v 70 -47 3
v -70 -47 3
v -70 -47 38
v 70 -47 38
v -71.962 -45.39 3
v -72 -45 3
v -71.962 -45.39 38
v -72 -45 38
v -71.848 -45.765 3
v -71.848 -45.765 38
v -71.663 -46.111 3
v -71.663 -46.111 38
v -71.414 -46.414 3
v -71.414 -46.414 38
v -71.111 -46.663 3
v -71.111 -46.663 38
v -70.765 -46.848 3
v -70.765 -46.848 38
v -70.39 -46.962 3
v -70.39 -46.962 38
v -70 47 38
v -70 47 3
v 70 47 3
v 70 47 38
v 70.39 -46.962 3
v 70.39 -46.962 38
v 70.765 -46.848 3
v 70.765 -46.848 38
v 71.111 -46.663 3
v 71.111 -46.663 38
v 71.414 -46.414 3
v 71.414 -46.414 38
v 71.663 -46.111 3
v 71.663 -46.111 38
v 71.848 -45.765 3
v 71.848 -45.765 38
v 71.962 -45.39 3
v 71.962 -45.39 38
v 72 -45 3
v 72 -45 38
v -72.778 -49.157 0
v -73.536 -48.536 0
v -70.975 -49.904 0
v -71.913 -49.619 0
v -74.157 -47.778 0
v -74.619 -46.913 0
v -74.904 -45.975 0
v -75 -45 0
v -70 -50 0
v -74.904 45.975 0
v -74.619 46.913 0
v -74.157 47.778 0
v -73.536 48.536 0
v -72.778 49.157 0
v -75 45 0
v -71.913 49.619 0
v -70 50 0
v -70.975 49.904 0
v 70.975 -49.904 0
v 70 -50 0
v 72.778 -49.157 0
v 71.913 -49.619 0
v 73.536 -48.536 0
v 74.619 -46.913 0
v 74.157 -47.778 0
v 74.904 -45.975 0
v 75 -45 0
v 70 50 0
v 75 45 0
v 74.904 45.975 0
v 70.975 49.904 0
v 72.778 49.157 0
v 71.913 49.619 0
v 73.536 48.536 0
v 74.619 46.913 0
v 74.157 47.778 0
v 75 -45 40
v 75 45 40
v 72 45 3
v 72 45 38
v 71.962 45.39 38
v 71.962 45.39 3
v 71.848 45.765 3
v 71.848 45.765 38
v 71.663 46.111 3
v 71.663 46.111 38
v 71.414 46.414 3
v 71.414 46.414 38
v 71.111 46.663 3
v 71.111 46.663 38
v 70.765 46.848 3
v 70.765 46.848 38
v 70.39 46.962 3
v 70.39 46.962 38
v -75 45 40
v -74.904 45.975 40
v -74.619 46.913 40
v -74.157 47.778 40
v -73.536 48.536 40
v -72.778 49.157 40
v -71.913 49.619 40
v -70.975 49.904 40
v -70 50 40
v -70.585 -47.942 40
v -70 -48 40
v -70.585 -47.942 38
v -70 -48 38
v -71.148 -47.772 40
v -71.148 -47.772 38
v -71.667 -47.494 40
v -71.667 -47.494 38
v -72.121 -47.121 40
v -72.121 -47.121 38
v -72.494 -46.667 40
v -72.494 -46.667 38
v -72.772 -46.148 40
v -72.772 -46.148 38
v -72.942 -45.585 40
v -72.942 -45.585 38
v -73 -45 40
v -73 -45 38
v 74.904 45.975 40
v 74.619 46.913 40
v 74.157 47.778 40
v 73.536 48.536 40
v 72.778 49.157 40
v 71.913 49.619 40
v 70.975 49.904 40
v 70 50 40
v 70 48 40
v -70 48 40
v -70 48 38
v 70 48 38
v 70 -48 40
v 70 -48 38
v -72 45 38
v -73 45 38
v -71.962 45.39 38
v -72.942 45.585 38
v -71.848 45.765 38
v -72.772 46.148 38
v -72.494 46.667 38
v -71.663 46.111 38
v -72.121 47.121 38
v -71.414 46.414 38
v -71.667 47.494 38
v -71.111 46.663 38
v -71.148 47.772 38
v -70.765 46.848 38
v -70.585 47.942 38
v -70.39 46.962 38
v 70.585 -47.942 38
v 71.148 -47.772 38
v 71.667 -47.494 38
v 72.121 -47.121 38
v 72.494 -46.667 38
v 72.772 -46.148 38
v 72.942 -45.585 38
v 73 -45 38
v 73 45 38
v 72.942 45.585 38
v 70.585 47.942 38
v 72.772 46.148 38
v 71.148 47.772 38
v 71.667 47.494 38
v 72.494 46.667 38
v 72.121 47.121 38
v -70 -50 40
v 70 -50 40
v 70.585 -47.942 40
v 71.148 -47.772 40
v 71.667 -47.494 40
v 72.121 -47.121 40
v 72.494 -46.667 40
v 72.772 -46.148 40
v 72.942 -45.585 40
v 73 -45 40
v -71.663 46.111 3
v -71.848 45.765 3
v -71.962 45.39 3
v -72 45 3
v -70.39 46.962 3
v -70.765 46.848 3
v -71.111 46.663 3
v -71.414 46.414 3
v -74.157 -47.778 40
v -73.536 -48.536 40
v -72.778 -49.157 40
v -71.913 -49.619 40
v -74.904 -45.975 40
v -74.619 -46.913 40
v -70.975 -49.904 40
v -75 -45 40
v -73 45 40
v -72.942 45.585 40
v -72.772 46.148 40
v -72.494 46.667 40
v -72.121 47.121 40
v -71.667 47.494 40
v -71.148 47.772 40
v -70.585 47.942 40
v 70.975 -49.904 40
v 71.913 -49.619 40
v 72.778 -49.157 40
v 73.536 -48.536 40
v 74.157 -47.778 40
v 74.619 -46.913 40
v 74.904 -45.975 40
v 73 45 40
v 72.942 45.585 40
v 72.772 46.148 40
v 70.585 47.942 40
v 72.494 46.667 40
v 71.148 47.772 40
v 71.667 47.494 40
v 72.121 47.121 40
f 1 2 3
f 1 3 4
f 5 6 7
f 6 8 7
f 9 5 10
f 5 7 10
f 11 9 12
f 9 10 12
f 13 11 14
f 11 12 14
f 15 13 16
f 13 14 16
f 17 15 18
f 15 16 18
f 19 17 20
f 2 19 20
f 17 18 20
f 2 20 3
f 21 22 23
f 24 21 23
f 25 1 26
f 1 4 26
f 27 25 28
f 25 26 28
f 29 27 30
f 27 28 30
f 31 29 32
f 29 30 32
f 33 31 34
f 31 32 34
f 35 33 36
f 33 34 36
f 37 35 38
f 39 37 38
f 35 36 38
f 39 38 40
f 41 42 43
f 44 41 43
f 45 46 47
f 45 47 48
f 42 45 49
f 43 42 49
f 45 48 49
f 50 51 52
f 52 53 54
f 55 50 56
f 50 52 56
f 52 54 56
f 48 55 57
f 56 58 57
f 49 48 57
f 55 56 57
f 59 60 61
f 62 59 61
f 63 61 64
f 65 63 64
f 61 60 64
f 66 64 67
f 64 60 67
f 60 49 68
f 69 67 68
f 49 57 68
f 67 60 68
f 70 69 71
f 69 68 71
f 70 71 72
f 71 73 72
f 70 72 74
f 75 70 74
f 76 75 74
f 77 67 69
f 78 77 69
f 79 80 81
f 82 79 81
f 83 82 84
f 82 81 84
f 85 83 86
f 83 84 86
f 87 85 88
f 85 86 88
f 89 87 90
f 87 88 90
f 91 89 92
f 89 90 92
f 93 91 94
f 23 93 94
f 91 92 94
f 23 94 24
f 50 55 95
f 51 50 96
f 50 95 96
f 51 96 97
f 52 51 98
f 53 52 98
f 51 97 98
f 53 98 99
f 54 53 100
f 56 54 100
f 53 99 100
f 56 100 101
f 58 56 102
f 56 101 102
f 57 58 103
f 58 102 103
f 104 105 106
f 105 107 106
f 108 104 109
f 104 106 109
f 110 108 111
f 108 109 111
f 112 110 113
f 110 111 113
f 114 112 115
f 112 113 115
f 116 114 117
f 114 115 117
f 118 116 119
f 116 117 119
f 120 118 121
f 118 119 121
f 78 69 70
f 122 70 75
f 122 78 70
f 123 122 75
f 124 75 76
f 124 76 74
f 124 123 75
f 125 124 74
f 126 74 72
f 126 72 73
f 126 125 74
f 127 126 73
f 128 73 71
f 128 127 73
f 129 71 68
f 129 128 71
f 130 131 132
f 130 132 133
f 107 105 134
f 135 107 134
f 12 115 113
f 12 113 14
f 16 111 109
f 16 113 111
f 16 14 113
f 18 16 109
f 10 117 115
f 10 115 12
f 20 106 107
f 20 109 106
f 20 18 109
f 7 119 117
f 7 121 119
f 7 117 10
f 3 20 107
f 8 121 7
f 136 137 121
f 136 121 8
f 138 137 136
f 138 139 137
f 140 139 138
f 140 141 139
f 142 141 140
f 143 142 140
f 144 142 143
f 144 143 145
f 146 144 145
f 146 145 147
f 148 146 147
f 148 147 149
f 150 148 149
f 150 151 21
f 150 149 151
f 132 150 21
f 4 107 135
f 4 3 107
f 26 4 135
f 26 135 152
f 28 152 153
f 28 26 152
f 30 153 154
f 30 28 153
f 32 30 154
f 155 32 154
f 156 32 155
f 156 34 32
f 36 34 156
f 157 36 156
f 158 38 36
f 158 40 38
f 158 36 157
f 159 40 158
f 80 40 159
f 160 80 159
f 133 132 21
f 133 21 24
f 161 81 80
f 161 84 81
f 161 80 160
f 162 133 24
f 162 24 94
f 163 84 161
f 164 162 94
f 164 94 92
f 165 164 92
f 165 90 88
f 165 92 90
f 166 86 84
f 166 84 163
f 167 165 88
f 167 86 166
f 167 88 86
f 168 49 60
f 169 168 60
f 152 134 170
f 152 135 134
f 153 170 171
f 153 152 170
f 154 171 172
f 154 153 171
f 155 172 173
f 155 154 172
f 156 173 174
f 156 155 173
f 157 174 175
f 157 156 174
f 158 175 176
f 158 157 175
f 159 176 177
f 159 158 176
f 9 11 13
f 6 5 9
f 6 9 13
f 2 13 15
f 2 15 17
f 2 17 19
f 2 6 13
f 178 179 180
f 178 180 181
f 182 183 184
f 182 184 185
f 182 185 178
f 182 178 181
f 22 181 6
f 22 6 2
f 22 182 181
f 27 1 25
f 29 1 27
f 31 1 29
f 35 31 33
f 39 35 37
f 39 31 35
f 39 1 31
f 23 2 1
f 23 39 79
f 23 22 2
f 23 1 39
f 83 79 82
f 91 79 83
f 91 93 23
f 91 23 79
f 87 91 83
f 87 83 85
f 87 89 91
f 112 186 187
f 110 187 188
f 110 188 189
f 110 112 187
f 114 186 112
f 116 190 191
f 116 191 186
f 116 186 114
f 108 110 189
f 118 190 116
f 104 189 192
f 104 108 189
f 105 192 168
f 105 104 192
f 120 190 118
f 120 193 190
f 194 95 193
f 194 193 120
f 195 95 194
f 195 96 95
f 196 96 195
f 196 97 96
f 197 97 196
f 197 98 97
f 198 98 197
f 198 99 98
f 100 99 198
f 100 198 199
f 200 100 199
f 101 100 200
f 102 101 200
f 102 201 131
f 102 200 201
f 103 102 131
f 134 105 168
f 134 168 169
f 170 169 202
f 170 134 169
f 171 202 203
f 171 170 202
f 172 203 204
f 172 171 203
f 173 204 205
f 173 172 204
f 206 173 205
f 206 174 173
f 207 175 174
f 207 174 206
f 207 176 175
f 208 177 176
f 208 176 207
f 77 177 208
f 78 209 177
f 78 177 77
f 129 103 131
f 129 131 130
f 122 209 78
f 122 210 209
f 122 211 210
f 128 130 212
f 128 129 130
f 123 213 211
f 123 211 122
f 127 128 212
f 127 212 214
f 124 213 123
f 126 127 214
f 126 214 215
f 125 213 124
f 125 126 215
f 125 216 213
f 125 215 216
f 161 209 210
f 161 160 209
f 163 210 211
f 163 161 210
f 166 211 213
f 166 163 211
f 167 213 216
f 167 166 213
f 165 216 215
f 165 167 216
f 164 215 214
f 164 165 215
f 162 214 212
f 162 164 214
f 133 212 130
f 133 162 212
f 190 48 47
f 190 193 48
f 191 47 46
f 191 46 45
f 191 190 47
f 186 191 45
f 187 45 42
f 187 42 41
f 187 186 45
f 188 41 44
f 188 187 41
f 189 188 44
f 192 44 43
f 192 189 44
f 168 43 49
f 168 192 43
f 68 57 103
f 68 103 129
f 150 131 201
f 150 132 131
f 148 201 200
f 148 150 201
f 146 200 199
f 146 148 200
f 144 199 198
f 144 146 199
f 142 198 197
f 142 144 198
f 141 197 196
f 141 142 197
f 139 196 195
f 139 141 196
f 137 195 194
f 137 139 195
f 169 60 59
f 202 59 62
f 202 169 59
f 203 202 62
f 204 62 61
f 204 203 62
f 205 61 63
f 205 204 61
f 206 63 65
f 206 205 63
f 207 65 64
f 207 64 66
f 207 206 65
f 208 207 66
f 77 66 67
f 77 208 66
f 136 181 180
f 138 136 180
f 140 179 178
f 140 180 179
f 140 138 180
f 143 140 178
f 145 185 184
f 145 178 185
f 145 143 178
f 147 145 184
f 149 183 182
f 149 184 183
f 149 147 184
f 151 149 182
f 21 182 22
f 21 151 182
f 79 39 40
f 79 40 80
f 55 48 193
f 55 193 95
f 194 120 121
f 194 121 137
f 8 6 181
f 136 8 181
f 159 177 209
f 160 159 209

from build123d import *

# Parameters (mm, degrees)
F0_W     = 150
F0_H     = 100
F1_DEPTH = 40
F2_R     = 5
F3_T     = -3
F4_W     = 146
F4_H     = 96
F5_DEPTH = 2
F6_R     = 3


with BuildPart() as f1:
    # F0 (on Top) → F1 (new body)
    with BuildSketch(Plane.XY):
        Rectangle(F0_W, F0_H)
    extrude(amount=F1_DEPTH)

    # F2
    f2_edges = [f1.edges().sort_by_distance(p)[0] for p in [
        (75, 50, 20),
        (-75, 50, 20),
        (-75, -50, 20),
        (75, -50, 20),
    ]]
    fillet(f2_edges, radius=F2_R)

    # F3
    f3_openings = [f1.faces().sort_by_distance(p)[0] for p in [
        (0, 0, 40),
    ]]
    offset(amount=F3_T, openings=f3_openings)

    # F4 (on face) → F5 (cut)
    with BuildSketch(Plane.XY.offset(40)):
        Rectangle(F4_W, F4_H)
    extrude(amount=-F5_DEPTH, mode=Mode.SUBTRACT)

    # F6
    f6_edges = [f1.edges().sort_by_distance(p)[0] for p in [
        (73, 48, 39),
        (73, -48, 39),
        (-73, 48, 39),
        (-73, -48, 39),
    ]]
    fillet(f6_edges, radius=F6_R)


solid = f1.part
